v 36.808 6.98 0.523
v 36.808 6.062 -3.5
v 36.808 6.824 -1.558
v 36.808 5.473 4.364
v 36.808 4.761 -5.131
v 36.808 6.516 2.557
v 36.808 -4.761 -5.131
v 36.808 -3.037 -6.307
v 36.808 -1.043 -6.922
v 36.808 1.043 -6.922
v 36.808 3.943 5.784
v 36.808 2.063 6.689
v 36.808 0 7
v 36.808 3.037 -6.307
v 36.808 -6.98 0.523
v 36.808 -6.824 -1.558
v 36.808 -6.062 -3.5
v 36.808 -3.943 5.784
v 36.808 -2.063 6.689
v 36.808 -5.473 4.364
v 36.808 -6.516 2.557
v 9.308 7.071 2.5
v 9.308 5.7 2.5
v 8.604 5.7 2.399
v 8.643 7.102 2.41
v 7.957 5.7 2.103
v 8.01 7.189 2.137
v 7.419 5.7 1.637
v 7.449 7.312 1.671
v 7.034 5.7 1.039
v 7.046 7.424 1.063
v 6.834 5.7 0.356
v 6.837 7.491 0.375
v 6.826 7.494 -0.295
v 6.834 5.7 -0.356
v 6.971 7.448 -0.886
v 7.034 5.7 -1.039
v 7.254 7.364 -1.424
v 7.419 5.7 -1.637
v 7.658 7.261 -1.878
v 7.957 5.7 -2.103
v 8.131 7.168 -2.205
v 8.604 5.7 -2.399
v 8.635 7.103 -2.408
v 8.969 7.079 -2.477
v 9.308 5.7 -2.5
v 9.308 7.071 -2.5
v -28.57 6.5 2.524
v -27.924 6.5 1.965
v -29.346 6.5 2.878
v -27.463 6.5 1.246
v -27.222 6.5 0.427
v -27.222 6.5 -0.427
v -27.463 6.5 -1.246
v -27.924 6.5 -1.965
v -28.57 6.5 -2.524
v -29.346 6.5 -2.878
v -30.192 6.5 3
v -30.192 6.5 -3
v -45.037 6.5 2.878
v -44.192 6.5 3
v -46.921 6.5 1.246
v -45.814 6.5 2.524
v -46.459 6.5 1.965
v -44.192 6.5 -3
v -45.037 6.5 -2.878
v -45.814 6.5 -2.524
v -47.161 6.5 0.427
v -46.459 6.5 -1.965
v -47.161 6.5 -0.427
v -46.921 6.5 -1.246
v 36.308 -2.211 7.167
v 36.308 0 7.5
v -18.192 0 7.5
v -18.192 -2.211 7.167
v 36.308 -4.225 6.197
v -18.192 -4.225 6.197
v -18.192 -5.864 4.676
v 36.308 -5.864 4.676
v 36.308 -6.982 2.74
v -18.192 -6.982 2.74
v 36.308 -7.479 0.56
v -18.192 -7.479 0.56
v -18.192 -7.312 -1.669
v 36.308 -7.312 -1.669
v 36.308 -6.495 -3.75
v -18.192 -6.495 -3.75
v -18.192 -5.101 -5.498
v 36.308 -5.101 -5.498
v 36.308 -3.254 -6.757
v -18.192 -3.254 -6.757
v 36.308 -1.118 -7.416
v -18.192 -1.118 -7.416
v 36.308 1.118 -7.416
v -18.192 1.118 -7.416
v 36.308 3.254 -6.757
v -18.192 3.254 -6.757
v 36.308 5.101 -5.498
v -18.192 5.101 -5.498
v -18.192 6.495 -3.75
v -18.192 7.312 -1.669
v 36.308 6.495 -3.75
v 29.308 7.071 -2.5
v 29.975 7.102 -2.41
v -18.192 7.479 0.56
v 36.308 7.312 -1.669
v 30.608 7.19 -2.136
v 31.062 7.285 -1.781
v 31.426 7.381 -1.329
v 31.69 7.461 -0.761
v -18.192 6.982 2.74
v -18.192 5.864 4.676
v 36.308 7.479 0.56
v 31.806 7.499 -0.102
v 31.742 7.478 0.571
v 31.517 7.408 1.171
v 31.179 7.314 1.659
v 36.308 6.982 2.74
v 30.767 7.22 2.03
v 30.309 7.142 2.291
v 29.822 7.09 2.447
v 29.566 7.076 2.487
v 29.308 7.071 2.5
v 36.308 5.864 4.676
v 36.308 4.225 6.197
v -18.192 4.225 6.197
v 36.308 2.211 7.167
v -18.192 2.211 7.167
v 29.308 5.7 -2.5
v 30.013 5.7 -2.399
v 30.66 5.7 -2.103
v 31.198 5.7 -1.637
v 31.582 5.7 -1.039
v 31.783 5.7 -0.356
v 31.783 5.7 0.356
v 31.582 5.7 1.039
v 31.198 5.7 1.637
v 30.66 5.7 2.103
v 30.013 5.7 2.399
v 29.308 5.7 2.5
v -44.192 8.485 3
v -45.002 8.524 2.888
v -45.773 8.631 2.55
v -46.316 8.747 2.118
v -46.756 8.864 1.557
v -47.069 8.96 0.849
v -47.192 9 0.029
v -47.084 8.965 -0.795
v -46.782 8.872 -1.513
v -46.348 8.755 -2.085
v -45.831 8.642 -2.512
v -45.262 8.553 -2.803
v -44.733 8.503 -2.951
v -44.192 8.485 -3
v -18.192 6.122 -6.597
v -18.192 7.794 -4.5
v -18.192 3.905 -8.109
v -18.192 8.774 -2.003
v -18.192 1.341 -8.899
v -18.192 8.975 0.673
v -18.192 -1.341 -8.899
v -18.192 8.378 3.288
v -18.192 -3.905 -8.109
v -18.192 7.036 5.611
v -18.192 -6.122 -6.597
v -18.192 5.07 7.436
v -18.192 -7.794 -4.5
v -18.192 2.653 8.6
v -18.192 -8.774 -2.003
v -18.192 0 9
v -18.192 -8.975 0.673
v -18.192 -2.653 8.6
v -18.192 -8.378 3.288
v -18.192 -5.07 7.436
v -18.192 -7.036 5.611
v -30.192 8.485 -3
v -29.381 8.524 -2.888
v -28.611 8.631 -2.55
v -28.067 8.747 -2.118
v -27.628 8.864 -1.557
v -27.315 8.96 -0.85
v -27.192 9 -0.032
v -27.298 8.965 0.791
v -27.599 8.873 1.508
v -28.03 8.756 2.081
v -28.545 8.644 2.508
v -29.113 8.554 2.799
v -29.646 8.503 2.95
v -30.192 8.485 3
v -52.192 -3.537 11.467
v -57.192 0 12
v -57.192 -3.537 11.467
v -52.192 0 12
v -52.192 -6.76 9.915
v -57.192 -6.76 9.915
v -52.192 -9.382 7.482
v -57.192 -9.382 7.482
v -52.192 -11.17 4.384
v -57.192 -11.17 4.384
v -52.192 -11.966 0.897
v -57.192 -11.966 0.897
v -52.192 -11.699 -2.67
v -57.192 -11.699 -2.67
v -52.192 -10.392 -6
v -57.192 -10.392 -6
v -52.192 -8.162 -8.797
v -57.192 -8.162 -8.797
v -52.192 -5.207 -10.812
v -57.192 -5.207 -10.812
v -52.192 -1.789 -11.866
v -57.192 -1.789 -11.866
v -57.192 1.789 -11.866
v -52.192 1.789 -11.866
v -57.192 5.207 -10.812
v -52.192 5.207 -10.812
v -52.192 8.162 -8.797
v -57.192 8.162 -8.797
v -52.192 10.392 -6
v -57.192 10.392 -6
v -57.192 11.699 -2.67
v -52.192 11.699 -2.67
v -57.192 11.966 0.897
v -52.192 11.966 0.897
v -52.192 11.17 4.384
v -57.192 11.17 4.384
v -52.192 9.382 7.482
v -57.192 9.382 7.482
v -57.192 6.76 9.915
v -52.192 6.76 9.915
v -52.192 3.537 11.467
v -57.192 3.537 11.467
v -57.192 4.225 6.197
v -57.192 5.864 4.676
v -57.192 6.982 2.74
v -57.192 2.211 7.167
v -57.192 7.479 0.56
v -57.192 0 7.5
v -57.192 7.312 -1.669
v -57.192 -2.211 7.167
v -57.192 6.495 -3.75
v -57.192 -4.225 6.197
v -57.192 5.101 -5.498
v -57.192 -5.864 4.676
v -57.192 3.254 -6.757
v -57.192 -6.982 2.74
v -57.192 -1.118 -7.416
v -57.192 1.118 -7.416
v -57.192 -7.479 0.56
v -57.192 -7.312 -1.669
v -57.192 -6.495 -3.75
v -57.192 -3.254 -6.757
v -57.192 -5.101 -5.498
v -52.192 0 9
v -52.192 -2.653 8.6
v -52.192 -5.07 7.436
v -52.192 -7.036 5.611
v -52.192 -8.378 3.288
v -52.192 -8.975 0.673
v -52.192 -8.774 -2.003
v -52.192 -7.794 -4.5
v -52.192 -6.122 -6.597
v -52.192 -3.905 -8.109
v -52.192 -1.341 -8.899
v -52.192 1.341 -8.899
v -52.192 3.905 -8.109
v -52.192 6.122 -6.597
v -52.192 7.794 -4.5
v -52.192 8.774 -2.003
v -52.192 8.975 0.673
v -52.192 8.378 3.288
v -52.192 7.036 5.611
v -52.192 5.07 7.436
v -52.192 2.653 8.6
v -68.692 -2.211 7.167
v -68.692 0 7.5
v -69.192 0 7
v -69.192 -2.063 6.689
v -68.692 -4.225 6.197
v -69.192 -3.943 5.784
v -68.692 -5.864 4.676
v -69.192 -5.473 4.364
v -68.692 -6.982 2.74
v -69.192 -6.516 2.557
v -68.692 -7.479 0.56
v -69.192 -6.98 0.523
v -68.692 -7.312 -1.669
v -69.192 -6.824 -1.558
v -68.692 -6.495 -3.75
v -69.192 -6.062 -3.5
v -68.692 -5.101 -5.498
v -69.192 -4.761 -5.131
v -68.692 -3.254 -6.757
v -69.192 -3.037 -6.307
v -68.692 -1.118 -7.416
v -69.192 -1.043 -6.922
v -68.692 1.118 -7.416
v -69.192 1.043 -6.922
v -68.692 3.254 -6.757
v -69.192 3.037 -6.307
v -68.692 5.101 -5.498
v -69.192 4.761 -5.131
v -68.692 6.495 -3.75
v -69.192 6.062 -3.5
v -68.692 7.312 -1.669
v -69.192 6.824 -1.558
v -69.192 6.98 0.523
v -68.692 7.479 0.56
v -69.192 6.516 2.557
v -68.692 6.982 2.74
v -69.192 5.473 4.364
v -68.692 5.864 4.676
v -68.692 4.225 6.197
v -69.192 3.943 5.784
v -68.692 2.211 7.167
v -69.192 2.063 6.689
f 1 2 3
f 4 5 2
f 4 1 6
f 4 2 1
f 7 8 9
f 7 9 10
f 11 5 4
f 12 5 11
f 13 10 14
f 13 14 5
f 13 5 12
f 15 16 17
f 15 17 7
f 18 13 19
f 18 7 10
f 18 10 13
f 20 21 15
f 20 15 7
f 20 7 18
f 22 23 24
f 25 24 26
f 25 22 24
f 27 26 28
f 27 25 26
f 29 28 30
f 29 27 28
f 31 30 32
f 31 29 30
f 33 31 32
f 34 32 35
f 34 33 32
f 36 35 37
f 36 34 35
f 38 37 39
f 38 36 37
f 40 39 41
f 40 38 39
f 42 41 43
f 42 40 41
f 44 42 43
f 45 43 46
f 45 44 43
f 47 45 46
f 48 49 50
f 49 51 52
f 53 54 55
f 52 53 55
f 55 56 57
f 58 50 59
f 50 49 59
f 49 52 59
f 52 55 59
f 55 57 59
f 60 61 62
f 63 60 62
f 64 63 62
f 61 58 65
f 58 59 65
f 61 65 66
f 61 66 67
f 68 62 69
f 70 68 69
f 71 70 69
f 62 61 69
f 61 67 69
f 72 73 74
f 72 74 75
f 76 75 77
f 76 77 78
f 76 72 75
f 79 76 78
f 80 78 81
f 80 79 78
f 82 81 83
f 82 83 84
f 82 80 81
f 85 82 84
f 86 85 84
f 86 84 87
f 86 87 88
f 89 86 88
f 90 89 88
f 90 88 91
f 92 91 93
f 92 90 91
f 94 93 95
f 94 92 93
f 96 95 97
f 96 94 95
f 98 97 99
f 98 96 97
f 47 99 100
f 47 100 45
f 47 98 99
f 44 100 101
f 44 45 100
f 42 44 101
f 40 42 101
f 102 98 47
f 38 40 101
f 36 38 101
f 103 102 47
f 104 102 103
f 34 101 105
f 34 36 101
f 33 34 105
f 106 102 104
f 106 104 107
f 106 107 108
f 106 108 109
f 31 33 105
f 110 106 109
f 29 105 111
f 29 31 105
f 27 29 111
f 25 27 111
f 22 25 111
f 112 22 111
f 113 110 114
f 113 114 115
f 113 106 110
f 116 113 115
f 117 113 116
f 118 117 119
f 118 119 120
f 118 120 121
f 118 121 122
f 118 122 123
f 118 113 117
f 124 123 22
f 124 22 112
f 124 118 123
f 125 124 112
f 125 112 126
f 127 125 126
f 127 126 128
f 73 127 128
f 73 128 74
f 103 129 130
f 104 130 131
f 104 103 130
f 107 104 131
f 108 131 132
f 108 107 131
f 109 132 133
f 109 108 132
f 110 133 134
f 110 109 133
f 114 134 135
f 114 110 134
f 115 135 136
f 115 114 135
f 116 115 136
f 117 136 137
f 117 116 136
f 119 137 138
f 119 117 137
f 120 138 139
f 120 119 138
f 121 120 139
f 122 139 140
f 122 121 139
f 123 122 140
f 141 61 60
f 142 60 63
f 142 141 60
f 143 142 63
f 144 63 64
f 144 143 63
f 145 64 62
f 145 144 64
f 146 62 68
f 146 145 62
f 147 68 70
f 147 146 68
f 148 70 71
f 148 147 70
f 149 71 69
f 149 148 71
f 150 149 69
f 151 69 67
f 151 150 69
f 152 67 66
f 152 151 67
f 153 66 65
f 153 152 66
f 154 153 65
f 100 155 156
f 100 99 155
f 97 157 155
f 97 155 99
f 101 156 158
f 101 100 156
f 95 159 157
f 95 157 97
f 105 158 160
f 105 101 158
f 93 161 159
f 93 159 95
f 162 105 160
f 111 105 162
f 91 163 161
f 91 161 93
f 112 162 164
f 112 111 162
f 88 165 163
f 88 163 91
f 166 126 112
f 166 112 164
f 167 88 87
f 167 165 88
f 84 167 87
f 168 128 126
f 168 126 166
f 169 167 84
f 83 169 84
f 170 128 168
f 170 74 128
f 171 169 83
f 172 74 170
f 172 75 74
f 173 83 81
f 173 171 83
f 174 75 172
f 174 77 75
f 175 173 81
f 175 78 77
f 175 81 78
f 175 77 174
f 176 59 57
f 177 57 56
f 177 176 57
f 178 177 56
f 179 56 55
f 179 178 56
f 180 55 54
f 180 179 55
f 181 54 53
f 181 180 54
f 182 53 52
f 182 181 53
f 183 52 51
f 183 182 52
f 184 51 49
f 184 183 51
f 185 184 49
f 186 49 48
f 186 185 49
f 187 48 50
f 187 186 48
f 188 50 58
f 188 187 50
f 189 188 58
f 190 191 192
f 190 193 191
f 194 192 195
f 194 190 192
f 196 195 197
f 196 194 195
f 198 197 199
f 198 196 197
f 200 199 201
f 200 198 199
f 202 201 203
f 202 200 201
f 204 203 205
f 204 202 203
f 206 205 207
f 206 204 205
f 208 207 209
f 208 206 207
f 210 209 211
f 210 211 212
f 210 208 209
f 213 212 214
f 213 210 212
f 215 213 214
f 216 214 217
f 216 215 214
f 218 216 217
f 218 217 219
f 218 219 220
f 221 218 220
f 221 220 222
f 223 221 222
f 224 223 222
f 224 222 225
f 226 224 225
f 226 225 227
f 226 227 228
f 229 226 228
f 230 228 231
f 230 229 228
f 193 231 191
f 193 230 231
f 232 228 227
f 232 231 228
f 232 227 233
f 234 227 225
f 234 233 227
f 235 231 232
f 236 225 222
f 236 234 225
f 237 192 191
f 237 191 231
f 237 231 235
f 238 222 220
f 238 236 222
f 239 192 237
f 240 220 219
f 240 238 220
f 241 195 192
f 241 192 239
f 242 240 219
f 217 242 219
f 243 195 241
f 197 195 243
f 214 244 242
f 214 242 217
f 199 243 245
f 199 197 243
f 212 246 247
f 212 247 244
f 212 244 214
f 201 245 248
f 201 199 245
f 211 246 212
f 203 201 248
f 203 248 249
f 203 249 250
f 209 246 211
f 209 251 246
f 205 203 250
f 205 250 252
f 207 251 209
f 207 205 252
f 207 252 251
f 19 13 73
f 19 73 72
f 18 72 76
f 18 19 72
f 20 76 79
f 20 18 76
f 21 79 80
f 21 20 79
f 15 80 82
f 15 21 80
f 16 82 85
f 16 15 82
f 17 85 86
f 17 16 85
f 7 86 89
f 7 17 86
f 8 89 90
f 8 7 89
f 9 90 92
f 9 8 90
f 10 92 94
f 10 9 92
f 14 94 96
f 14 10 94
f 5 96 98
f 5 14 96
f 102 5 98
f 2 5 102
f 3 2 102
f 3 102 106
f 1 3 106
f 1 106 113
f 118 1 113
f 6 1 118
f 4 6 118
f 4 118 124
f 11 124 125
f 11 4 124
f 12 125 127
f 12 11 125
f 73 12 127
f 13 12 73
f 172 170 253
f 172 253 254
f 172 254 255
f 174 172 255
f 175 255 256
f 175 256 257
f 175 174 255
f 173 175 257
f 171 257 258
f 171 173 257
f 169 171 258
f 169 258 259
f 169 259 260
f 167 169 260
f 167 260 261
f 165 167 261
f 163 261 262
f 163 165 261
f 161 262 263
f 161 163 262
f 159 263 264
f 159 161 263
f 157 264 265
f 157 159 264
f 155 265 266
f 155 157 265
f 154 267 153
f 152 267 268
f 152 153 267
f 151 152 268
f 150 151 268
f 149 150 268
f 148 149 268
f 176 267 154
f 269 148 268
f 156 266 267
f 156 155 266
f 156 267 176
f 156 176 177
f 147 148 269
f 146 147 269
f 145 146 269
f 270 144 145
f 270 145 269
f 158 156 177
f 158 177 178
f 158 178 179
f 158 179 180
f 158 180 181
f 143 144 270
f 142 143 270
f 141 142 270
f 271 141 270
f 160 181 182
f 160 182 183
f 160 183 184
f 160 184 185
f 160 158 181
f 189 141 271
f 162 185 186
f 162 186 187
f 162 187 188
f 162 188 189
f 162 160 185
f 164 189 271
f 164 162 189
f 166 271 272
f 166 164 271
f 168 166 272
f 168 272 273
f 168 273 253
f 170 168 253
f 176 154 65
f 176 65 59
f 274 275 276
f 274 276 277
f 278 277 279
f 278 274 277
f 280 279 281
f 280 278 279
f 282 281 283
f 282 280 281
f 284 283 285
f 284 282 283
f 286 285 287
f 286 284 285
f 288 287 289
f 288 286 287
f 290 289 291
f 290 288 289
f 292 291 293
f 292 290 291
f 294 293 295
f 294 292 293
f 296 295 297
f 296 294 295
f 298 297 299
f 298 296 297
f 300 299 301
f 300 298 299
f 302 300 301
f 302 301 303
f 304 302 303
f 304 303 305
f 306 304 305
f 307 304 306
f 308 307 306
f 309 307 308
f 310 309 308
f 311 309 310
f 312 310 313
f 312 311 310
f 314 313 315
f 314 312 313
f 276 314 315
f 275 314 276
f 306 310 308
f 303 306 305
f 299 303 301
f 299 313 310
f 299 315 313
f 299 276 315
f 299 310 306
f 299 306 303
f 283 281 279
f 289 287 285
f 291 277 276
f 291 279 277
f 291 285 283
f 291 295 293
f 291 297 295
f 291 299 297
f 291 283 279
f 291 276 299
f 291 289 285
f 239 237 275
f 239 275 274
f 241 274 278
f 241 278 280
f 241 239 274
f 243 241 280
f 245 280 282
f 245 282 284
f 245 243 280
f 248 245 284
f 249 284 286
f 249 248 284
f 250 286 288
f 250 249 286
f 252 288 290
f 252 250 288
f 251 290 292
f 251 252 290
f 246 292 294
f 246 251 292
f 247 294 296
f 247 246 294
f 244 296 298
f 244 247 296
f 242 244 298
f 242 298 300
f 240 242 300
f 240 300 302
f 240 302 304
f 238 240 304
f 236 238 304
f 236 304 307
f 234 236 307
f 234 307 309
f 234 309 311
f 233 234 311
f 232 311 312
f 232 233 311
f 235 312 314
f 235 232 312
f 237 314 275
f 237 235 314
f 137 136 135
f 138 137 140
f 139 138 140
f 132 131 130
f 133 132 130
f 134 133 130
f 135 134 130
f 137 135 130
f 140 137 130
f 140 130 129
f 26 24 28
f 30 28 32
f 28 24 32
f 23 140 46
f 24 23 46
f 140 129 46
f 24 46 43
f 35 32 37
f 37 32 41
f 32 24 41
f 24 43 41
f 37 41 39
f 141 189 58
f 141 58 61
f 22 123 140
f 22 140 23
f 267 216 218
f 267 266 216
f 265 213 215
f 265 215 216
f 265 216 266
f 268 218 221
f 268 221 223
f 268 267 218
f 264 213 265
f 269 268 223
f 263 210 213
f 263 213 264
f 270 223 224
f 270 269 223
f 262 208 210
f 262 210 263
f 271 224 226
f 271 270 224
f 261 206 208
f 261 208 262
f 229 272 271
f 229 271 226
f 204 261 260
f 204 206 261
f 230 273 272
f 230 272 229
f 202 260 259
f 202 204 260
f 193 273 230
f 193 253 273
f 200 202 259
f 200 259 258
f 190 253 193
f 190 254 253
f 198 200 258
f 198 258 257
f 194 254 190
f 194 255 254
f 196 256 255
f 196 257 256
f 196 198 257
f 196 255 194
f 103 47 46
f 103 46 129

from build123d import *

# Parameters (mm, degrees)
CUT_EXTRUDE1_DEPTH = 2.5
CUT_EXTRUDE2_DEPTH = 1.8
CHAMFER1_SIZE      = 0.5


with BuildPart() as part:
    # Sketch1 → Revolve1 (revolve)
    with BuildSketch(Plane.XY, mode=Mode.PRIVATE) as revolve1_sk:
        Polygon((-69.191650854, 0), (-69.191650854, 7.5), (-57.191650854, 7.5), (-57.191650854, 12), (-52.191650854, 12), (-52.191650854, 9), (-18.191650854, 9), (-18.191650854, 7.5), (36.808349146, 7.5), (36.808349146, 0), align=None)
    revolve(revolve1_sk.sketch.rotate(Axis((-89.707779886, 0, 0), (1, 0, 0)), 90), axis=Axis((-89.707779886, 0, 0), (1, 0, 0)))

    # Sketch2 → Cut-Extrude1 (cut)
    with BuildSketch(Plane(origin=(0, 9, 0), x_dir=(1, 0, 0), z_dir=(0, 1, 0))):
        with BuildLine():
            Line((-44.191650854, 3), (-30.191650854, 3))
            ThreePointArc((-30.191650854, 3), (-27.191650854, 0), (-30.191650854, -3))
            Line((-30.191650854, -3), (-44.191650854, -3))
            ThreePointArc((-44.191650854, -3), (-47.191650854, 0), (-44.191650854, 3))
        make_face()
    extrude(amount=-CUT_EXTRUDE1_DEPTH, mode=Mode.SUBTRACT)

    # Sketch3 → Cut-Extrude2 (cut)
    with BuildSketch(Plane(origin=(0, 7.5, 0), x_dir=(1, 0, 0), z_dir=(0, 1, 0))):
        with BuildLine():
            Line((9.308349146, 2.5), (29.308349146, 2.5))
            ThreePointArc((29.308349146, 2.5), (31.808349146, 0), (29.308349146, -2.5))
            Line((29.308349146, -2.5), (9.308349146, -2.5))
            ThreePointArc((9.308349146, -2.5), (6.808349146, 0), (9.308349146, 2.5))
        make_face()
    extrude(amount=-CUT_EXTRUDE2_DEPTH, mode=Mode.SUBTRACT)

    # Chamfer1
    chamfer1_edges = [part.edges().sort_by_distance(p)[0] for p in [
        (-69.191650854, 0, -7.5),
        (36.808349146, 0, -7.5),
    ]]
    chamfer(chamfer1_edges, length=CHAMFER1_SIZE)


solid = part.part
